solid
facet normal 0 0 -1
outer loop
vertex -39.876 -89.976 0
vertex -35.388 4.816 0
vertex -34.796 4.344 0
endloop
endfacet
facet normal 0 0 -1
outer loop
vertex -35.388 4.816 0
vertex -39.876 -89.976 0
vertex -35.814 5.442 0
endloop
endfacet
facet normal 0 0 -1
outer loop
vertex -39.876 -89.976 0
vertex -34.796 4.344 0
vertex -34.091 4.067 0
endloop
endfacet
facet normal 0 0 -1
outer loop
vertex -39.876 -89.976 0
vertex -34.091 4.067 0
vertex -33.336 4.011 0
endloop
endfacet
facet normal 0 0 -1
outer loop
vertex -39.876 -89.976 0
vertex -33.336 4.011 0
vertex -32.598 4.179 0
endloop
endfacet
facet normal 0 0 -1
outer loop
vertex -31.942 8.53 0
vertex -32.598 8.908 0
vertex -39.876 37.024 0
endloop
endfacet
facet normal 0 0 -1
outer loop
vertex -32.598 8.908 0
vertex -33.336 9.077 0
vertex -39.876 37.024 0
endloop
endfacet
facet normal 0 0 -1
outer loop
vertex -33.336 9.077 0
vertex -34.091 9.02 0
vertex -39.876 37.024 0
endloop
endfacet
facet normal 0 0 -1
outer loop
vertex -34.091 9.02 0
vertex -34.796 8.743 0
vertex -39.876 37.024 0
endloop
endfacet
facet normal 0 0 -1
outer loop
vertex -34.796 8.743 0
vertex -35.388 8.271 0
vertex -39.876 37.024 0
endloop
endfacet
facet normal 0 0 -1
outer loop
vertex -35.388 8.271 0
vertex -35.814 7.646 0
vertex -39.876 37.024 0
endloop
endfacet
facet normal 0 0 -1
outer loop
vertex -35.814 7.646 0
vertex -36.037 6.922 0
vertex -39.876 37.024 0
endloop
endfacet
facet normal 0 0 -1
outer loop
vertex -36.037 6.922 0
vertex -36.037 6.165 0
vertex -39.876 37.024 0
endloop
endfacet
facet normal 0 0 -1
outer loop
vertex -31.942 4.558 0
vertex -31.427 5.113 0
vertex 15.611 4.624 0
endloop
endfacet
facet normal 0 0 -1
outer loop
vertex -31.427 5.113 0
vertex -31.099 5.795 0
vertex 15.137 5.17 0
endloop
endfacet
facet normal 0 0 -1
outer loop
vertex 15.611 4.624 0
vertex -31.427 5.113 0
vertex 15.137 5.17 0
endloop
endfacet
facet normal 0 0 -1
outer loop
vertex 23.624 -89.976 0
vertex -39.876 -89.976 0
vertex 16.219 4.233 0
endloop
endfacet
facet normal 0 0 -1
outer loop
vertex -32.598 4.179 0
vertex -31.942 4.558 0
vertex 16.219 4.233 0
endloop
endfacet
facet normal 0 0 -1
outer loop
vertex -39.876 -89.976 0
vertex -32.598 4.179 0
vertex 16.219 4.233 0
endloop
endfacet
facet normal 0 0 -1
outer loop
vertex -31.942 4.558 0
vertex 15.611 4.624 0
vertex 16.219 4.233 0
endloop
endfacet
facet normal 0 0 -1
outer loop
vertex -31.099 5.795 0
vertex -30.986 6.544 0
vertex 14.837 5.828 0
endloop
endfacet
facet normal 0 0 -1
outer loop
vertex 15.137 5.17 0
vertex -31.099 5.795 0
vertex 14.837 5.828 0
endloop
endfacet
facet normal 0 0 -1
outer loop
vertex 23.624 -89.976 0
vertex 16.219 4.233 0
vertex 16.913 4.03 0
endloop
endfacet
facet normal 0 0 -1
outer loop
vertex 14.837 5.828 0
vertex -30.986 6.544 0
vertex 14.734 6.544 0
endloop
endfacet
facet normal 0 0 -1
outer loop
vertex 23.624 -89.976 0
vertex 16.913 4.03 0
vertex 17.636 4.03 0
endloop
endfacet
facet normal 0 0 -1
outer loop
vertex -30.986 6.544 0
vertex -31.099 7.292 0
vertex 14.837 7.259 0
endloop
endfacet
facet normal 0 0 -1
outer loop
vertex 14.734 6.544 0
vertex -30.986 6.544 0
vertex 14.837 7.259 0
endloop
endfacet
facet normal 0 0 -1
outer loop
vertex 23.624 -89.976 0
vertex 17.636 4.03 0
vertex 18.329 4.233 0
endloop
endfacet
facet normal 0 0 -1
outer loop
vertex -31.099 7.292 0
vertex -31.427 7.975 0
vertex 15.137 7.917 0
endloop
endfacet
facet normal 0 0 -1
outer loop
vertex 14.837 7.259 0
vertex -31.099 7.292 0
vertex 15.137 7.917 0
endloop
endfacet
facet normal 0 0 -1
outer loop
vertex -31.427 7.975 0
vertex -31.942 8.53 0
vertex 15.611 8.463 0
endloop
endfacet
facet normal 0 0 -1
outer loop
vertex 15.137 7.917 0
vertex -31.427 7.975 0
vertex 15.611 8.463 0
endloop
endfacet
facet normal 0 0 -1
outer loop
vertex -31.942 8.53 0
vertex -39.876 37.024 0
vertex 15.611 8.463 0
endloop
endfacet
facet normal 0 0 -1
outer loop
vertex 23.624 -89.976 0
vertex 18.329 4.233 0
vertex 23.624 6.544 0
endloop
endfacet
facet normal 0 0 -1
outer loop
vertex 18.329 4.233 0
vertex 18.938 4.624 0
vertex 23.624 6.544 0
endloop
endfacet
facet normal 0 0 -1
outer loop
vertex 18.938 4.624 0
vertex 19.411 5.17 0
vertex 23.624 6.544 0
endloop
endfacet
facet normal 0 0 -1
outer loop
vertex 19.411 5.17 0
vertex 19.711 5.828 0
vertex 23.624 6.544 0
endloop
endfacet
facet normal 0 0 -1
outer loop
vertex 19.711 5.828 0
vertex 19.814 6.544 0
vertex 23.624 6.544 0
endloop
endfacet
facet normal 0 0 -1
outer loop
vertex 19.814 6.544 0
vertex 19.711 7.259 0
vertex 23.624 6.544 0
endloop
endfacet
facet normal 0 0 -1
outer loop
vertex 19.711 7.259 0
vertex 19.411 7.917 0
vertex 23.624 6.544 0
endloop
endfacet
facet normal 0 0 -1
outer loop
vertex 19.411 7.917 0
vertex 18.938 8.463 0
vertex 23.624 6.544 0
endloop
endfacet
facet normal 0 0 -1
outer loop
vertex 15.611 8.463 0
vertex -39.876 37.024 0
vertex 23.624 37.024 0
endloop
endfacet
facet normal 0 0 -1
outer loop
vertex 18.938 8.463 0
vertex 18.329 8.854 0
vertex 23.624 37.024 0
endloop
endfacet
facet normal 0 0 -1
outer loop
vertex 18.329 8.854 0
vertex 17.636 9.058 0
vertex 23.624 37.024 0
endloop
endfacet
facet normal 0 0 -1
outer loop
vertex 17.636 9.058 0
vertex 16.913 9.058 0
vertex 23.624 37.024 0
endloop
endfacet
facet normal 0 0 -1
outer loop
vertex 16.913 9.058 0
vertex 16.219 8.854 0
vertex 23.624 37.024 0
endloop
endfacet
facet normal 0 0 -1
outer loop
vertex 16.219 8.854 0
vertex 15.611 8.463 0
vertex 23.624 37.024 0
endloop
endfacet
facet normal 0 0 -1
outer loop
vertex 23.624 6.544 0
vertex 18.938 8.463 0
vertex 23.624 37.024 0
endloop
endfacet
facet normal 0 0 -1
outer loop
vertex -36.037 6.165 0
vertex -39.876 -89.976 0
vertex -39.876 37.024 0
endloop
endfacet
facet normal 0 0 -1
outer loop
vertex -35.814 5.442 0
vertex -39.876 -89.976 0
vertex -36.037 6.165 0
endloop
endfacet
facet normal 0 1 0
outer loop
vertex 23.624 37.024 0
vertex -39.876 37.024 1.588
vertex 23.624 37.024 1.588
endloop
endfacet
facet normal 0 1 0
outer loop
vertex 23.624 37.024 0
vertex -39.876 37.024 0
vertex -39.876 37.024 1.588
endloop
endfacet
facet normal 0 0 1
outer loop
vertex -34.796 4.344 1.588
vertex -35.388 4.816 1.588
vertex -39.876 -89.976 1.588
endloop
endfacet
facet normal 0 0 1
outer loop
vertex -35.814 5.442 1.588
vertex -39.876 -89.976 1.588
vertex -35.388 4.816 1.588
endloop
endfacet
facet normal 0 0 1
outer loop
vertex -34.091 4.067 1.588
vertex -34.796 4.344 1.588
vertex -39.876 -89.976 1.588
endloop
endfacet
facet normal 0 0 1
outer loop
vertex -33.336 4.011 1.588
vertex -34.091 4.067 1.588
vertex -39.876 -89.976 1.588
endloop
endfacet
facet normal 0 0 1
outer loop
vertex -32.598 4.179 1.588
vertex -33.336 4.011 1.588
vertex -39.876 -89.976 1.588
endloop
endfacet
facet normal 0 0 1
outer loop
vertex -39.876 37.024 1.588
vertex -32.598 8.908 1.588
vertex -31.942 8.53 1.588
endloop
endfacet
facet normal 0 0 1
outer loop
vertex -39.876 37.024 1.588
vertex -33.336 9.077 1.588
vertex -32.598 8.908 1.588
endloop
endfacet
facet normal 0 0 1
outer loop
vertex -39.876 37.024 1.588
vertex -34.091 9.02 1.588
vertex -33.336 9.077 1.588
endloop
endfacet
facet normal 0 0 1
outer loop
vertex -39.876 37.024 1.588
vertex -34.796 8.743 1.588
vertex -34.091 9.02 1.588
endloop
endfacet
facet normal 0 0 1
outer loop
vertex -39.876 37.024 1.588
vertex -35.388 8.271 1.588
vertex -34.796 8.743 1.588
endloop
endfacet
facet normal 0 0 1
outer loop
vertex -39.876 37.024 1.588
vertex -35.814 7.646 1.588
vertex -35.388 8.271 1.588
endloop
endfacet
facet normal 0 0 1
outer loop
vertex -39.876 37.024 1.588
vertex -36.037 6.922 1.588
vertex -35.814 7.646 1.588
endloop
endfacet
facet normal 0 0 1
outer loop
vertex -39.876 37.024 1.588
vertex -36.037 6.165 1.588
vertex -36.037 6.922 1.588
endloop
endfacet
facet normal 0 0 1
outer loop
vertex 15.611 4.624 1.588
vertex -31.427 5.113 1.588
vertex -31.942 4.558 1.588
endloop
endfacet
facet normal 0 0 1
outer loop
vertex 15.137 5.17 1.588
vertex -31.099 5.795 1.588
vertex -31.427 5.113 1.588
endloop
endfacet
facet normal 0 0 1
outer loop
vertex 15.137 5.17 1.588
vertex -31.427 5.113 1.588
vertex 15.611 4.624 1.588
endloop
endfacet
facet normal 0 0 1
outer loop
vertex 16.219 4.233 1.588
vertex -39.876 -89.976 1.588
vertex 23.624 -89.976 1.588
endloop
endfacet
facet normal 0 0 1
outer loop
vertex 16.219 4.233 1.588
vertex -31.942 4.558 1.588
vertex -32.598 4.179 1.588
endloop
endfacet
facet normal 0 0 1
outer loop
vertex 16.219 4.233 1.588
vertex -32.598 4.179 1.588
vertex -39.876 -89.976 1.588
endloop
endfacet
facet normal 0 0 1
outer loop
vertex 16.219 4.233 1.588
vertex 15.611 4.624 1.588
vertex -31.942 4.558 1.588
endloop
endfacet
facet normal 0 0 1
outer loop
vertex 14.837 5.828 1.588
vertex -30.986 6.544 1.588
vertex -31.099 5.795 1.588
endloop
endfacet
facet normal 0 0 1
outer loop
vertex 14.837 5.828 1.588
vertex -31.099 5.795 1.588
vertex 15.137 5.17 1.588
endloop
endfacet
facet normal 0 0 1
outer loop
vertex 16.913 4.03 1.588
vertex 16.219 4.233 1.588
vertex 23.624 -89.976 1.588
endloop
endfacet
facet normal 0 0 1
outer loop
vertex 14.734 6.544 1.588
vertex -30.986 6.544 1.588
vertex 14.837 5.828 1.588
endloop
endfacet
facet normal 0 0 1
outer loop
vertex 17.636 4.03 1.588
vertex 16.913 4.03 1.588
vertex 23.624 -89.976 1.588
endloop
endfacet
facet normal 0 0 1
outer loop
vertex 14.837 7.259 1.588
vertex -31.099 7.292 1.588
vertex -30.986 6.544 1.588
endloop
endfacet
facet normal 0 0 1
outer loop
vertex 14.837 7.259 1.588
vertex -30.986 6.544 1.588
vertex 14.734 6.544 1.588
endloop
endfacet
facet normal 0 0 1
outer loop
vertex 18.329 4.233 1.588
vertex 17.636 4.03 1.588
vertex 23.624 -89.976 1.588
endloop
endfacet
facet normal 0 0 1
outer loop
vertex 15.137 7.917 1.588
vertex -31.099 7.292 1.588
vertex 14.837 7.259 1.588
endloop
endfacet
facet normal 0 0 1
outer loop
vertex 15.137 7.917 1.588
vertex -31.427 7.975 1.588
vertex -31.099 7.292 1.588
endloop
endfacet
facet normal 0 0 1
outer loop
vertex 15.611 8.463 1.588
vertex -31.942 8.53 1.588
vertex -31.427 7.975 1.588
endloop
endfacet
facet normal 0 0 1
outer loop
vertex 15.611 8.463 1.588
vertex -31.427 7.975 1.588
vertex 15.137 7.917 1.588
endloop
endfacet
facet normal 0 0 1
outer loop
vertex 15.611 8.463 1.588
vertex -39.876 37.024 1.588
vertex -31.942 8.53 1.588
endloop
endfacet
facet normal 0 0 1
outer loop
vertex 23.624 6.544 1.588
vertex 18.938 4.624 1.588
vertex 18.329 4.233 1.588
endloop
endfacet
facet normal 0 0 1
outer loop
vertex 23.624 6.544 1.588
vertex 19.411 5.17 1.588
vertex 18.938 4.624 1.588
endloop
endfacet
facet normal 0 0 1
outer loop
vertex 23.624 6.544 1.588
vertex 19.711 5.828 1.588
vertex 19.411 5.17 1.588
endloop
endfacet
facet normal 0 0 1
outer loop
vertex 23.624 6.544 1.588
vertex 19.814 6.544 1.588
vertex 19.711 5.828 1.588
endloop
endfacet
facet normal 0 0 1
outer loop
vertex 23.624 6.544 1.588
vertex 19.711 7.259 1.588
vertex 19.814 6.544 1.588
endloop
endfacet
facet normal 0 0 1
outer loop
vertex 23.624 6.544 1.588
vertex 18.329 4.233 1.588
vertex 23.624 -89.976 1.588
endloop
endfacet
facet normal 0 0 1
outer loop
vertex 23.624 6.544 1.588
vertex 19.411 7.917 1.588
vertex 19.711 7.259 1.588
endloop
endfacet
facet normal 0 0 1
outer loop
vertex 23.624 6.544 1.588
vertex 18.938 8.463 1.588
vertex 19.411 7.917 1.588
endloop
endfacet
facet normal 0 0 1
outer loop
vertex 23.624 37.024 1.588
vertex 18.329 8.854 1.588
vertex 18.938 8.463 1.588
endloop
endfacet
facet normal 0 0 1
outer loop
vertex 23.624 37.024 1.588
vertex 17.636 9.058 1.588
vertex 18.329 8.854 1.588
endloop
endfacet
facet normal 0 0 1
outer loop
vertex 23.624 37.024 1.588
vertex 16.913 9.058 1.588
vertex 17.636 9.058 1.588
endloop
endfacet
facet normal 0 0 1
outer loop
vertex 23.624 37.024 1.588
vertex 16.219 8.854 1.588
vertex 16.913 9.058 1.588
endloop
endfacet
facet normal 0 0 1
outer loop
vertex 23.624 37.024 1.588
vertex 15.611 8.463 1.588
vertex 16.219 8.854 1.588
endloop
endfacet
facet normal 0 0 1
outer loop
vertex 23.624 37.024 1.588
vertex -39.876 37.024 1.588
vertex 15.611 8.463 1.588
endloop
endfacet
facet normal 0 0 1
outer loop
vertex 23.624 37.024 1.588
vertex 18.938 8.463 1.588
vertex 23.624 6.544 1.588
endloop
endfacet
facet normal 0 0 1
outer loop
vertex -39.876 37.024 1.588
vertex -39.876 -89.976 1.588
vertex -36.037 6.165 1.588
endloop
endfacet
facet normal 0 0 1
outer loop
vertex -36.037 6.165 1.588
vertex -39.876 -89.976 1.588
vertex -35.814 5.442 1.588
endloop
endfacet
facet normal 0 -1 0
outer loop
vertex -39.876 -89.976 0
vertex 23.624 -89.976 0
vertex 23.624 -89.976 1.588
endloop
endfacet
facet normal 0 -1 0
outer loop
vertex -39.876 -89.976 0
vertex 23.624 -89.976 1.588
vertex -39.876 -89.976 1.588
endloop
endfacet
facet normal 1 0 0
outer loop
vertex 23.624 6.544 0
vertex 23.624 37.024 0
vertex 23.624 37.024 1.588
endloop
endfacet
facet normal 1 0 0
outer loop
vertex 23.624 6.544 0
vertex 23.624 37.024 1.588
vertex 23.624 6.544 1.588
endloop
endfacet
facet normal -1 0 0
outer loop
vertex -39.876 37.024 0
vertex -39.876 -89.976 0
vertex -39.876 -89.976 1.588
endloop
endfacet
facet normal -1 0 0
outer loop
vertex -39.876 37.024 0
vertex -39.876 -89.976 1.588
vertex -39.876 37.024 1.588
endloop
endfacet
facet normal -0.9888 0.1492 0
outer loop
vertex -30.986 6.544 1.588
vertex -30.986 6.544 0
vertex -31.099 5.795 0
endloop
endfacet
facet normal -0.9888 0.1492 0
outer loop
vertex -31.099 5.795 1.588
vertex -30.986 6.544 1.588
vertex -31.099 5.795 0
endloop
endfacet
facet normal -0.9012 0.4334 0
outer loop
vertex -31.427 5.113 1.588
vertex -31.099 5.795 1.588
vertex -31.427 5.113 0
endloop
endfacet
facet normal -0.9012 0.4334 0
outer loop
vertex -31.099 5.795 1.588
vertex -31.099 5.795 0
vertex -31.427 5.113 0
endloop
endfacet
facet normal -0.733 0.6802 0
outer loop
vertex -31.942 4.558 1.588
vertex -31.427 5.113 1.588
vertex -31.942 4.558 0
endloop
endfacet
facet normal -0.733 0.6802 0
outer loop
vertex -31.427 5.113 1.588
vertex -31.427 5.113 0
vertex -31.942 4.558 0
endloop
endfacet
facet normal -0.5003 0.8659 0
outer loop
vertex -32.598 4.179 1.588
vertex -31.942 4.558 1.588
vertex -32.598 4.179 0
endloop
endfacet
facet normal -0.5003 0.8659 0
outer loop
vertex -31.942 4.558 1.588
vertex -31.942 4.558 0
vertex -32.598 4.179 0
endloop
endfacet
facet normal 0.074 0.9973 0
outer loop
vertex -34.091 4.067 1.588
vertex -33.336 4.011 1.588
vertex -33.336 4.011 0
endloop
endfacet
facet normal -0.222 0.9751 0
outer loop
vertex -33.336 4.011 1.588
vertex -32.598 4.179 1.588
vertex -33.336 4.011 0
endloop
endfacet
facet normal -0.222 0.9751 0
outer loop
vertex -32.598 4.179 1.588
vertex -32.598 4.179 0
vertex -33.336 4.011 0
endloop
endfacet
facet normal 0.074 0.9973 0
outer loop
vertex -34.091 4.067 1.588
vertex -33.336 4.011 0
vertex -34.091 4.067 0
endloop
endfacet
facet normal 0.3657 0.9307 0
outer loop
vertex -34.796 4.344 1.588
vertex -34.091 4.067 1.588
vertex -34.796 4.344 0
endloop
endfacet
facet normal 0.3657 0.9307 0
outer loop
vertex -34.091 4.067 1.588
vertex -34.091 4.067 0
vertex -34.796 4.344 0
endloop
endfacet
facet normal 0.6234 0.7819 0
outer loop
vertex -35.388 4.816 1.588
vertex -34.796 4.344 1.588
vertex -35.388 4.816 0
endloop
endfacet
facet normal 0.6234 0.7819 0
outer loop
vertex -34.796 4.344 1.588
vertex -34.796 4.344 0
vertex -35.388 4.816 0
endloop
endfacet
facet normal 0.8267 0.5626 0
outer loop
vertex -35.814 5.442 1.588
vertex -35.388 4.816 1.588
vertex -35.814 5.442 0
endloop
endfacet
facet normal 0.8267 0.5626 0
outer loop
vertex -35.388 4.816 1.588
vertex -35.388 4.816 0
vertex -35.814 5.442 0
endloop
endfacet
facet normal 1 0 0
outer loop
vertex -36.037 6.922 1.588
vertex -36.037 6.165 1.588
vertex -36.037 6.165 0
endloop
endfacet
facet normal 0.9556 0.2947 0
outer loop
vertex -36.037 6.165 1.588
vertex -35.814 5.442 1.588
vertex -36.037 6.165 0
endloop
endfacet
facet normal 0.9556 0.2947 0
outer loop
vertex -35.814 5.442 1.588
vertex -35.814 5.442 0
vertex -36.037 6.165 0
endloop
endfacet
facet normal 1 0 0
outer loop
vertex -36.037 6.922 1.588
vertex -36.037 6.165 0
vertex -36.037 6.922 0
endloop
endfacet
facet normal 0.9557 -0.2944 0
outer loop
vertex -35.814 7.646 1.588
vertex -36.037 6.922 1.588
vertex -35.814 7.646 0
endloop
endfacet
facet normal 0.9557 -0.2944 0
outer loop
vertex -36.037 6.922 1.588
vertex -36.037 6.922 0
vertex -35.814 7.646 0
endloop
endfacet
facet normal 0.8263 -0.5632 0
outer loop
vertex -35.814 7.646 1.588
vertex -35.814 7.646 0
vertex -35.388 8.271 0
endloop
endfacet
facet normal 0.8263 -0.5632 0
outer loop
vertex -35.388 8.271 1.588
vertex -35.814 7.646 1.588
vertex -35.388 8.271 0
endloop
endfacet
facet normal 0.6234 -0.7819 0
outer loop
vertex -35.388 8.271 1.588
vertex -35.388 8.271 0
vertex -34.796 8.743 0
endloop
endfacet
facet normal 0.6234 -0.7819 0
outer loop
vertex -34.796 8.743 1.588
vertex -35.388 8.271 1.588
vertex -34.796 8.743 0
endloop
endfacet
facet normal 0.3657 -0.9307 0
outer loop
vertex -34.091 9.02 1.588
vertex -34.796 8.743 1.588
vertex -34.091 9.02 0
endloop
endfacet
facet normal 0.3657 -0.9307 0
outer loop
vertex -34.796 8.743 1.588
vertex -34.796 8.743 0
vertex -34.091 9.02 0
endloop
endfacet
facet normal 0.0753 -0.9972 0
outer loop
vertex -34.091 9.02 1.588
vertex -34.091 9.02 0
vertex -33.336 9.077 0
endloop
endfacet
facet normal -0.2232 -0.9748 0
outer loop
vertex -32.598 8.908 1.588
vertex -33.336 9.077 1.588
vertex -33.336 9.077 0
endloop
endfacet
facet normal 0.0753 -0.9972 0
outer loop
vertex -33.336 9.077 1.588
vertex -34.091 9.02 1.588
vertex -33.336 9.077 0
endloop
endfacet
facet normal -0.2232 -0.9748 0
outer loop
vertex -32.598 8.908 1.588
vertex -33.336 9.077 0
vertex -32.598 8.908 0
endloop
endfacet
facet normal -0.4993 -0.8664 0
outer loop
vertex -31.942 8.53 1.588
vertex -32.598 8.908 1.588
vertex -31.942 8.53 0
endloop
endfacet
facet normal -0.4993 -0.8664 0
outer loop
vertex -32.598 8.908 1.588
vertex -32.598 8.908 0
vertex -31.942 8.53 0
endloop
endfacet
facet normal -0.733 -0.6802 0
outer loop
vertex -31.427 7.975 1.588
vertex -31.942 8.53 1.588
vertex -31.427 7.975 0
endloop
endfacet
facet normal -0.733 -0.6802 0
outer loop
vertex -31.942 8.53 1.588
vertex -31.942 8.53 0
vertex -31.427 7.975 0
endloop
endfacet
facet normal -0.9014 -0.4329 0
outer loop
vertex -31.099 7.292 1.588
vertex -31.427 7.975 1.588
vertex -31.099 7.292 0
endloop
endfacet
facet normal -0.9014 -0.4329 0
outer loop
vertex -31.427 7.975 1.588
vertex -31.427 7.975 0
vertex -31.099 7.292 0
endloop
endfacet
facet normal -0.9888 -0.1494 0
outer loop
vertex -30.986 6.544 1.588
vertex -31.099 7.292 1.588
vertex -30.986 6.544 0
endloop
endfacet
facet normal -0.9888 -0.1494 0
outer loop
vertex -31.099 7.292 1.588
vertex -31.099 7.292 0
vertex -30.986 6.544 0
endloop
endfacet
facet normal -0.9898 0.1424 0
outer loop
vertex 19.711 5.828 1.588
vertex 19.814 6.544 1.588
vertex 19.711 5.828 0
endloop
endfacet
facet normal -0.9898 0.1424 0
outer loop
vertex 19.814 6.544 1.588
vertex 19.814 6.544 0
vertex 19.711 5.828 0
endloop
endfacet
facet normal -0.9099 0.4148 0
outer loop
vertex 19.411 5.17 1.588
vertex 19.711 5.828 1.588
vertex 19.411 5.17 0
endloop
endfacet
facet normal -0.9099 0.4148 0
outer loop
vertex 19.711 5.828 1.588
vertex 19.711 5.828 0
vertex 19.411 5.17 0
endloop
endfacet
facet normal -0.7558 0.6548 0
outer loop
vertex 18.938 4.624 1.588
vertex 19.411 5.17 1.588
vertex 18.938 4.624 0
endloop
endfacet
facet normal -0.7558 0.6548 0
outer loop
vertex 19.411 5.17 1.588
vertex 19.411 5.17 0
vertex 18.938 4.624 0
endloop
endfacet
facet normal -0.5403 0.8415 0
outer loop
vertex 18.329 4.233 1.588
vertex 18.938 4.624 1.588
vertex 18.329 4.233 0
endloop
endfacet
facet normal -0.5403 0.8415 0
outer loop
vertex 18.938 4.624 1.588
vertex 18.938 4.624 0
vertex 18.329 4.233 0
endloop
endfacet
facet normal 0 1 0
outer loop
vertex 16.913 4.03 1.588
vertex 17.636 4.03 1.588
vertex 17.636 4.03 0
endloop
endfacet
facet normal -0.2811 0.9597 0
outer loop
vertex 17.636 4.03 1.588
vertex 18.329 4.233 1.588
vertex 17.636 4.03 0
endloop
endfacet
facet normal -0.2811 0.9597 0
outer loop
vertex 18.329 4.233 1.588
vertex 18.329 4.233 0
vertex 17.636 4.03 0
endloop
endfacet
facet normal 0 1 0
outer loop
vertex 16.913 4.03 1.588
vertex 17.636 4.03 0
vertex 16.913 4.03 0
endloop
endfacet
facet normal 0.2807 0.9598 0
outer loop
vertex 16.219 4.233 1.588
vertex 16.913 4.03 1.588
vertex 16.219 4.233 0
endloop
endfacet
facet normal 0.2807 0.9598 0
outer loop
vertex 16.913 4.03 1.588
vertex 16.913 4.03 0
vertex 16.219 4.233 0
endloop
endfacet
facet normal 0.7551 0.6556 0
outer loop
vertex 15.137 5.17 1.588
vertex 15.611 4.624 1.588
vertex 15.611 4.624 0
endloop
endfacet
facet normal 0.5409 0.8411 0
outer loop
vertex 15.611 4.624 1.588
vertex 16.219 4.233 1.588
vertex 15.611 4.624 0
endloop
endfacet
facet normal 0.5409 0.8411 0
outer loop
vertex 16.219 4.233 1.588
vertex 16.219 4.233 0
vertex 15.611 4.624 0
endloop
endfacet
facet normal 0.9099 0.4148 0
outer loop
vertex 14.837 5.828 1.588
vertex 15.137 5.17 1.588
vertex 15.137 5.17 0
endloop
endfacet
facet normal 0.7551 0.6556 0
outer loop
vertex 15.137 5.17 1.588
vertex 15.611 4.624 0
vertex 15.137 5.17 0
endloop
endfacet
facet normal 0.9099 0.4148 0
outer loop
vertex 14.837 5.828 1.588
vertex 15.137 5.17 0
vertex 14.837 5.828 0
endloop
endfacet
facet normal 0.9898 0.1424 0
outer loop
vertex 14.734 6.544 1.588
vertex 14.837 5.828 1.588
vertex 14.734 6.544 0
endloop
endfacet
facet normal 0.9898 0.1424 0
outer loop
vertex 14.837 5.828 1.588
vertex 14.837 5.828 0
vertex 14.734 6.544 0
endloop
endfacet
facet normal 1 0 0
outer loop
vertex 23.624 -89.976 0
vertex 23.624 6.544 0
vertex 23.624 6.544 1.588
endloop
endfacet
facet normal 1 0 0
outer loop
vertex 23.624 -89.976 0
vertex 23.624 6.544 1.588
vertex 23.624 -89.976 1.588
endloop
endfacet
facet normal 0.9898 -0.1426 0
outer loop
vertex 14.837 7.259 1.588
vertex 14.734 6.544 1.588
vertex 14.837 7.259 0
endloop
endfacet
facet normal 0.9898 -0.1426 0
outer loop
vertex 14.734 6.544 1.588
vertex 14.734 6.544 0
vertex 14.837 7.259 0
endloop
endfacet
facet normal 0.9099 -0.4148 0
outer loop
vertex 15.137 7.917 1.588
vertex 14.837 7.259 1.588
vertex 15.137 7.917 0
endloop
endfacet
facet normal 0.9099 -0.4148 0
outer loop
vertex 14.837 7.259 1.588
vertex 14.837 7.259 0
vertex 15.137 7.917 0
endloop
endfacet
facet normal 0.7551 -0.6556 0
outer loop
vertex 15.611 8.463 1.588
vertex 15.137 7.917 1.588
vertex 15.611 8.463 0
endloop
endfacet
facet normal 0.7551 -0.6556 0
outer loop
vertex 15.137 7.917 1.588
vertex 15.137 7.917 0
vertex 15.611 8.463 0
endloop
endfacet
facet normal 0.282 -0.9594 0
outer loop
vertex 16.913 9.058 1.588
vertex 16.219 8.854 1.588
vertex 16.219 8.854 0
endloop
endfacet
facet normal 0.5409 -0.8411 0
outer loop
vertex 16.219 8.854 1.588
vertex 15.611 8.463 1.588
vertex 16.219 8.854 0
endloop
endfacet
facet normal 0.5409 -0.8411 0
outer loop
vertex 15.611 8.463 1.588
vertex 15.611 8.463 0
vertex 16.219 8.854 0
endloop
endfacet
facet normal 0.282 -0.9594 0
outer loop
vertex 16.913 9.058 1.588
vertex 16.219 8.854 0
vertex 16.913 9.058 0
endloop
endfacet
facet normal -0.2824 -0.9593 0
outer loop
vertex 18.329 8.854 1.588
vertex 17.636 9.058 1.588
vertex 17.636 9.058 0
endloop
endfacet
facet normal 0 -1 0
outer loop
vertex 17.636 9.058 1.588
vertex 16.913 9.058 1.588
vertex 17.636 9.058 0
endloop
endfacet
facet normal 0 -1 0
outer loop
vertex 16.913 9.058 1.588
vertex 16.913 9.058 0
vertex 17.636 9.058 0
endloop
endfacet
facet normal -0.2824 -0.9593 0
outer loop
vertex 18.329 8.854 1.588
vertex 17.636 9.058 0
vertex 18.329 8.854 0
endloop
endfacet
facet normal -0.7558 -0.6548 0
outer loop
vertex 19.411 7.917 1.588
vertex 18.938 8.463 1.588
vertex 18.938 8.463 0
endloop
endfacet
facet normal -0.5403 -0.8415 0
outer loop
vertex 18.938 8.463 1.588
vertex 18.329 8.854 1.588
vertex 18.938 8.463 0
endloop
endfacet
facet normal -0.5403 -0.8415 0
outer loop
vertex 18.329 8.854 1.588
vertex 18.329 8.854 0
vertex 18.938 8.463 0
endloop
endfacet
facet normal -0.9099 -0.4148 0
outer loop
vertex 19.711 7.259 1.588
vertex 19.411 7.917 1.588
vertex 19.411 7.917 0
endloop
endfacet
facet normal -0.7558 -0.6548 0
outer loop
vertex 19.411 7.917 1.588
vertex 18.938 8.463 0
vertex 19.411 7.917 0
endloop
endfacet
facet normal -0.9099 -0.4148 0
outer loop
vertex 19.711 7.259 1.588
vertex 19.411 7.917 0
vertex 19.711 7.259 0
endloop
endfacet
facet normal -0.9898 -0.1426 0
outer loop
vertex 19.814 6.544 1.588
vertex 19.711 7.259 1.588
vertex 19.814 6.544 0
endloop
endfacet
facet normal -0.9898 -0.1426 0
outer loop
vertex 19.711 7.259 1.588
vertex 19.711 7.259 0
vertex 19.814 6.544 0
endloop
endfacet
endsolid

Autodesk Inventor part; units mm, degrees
ref_plane "YZ Plane" through (0, 0, 0) normal (1, 0, 0) x (0, 1, 0)
ref_plane "XZ Plane" through (0, 0, 0) normal (0, 1, 0) x (-1, 0, 0)
ref_plane "XY Plane" through (0, 0, 0) normal (0, 0, 1) x (1, 0, 0)
sketch "Sketch1" plane through (0, 0, 0) normal (0, 0, 1) x (1, 0, 0)
  line L0 (-39.8758, 37.0237) -> (23.6242, 37.0237)
  line L1 (23.6242, 37.0237) -> (23.6242, -89.9763)
  line L2 (23.6242, -89.9763) -> (-39.8758, -89.9763)
  line L3 (-39.8758, -89.9763) -> (-39.8758, 37.0237)
  line L4 (23.6242, 37.0237) -> (23.6242, 6.5437)
  line L5 (23.6242, 6.5437) -> (17.2742, 6.5437)
  circle A0 centre (17.2742, 6.5437) radius 2.54
  line L6 (17.2742, 6.5437) -> (-33.5258, 6.5437)
  circle A1 centre (-33.5258, 6.5437) radius 2.54
  point P0 (0, 0)
  dimension "d0" = 63.5
  dimension "d1" = 127
  dimension "d4" = 30.48
  dimension "d5" = 6.35
  dimension "d6" = 5.08
  dimension "d7" = 50.8
  dimension "d8" = 5.08
extrude "Extrusion2" add sketch "Sketch1" along normal blind 1.5875
properties part number "Kicker Poly Top Part"
